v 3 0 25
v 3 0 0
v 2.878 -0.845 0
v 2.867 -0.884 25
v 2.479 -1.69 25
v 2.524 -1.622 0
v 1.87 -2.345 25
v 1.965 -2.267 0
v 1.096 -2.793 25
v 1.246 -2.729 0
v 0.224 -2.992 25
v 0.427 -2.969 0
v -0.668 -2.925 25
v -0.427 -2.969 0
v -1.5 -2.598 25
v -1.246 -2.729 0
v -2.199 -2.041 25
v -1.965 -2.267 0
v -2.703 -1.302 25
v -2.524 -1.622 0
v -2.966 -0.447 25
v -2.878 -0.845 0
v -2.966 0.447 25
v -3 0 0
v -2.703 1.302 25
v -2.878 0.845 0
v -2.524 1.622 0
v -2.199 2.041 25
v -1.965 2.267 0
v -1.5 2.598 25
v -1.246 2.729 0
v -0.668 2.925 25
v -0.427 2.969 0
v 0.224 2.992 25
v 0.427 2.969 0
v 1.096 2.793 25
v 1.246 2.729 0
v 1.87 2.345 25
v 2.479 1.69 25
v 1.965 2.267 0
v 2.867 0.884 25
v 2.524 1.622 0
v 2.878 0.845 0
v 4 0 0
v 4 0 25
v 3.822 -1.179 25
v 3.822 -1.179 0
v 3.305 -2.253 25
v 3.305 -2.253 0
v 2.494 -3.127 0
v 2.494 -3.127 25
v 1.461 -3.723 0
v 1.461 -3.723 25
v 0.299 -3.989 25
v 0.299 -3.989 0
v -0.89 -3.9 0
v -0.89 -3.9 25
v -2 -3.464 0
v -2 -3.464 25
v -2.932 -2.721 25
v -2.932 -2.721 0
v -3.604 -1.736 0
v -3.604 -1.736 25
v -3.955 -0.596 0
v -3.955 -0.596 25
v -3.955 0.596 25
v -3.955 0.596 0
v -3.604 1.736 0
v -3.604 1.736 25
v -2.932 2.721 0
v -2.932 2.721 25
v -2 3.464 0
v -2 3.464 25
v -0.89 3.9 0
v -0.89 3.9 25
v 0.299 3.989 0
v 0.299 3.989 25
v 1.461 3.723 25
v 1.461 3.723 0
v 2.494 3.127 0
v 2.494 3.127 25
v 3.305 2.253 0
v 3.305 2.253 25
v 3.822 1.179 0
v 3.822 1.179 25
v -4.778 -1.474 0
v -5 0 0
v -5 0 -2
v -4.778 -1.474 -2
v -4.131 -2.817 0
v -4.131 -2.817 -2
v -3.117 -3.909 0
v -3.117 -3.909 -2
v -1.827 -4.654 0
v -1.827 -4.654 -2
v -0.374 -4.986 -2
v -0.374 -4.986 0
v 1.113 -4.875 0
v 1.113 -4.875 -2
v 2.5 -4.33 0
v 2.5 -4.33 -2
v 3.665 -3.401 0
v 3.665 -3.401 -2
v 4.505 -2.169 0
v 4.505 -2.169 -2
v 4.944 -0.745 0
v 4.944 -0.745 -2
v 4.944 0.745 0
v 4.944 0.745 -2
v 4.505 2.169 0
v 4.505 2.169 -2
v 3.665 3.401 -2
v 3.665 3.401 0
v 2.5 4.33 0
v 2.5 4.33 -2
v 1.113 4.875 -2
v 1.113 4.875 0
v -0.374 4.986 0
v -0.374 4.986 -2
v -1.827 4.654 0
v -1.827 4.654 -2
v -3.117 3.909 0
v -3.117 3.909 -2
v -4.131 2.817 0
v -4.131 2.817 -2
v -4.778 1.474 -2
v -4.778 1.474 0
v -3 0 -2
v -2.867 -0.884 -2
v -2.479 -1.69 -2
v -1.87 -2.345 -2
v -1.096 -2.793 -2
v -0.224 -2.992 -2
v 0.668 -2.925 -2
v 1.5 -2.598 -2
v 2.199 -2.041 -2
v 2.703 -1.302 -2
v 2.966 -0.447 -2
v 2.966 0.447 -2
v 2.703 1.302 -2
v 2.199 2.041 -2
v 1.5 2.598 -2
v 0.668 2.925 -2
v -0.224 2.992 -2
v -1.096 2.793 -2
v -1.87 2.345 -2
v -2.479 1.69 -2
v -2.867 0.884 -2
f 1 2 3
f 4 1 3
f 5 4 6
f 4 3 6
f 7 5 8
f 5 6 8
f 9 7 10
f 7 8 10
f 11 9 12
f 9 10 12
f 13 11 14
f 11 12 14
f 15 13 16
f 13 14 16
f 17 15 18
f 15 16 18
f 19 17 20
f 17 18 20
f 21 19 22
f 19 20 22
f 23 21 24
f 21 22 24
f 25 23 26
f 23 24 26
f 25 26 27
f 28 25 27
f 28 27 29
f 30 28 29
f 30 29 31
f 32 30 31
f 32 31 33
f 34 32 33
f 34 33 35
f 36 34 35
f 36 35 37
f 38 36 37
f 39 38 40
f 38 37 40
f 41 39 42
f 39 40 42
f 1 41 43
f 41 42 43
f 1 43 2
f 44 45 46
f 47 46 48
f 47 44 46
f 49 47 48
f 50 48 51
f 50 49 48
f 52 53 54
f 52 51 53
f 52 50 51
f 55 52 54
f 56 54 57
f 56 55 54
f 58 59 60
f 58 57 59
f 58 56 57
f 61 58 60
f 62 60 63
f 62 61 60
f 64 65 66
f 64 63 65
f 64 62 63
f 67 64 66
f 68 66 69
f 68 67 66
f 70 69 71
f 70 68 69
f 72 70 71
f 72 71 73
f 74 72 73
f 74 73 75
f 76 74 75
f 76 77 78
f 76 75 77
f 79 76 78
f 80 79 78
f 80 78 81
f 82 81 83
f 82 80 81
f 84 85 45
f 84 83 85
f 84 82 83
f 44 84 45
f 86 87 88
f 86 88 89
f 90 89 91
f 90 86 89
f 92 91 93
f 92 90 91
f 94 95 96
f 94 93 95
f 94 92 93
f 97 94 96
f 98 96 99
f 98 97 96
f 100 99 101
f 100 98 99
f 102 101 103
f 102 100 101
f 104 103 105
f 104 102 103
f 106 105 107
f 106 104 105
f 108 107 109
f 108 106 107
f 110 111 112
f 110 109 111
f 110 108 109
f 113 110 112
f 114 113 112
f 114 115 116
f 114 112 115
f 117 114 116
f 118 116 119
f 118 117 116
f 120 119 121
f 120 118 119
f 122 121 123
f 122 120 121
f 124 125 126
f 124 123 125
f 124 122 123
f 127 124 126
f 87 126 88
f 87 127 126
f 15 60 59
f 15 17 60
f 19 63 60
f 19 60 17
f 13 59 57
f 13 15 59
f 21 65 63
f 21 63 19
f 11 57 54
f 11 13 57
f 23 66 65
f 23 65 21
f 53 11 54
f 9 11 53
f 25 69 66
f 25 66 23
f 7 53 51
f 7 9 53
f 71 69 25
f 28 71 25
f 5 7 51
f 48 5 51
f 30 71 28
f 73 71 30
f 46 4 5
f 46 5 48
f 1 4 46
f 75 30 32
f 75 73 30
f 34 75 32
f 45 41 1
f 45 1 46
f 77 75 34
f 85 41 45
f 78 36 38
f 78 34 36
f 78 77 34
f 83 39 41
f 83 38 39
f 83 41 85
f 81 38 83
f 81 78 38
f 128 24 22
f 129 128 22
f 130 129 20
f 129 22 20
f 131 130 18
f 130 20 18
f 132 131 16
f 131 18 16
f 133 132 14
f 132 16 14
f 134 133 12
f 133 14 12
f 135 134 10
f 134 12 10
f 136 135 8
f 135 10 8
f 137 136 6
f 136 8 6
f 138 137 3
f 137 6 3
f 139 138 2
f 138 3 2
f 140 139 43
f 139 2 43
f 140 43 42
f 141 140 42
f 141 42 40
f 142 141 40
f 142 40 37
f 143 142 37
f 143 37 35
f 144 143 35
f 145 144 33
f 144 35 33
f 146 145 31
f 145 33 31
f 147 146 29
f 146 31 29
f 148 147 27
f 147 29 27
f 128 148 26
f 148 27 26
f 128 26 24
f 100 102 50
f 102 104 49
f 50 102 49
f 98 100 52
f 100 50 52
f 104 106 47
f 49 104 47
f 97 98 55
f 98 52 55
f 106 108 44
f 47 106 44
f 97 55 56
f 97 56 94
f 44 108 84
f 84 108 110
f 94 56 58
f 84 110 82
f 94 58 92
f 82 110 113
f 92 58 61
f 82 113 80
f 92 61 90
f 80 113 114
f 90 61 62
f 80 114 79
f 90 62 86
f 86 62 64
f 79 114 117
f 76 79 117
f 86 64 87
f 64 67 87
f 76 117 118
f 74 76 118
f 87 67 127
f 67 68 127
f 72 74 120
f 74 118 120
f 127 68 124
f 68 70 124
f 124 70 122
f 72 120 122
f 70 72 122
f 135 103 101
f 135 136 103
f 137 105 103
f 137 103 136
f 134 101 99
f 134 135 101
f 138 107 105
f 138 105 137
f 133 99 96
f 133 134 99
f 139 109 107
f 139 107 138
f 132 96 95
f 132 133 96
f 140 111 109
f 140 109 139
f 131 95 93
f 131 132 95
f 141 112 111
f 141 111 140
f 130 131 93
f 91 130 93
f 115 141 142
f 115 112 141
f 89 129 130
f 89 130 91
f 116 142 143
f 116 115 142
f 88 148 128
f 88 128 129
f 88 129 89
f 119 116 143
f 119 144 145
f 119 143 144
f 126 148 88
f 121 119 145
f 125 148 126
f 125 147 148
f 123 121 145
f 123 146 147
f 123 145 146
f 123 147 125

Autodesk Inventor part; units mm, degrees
ref_plane "YZ Plane" through (0, 0, 0) normal (1, 0, 0) x (0, 1, 0)
ref_plane "XZ Plane" through (0, 0, 0) normal (0, 1, 0) x (-1, 0, 0)
ref_plane "XY Plane" through (0, 0, 0) normal (0, 0, 1) x (1, 0, 0)
sketch "Szkic1" plane through (0, 0, 0) normal (0, 0, 1) x (1, 0, 0)
  circle A0 centre (0, 0) radius 3
  circle A1 centre (0, 0) radius 4
  dimension "d0" = 6
  dimension "d1" = 8
extrude "Wyciągnięcie proste1" add sketch "Szkic1" along normal blind 25
sketch "Szkic2" plane through (0, 0, 0) normal (0, 0, -1) x (-1, 0, 0)
  circle A0 centre (0, 0) radius 3
  circle A1 centre (0, 0) radius 5
  dimension "d4" = 6
  dimension "d5" = 10
extrude "Wyciągnięcie proste2" add sketch "Szkic2" along normal blind 2
properties part number "tuleja-palak" material "Mosiądz, miękki żółty"
